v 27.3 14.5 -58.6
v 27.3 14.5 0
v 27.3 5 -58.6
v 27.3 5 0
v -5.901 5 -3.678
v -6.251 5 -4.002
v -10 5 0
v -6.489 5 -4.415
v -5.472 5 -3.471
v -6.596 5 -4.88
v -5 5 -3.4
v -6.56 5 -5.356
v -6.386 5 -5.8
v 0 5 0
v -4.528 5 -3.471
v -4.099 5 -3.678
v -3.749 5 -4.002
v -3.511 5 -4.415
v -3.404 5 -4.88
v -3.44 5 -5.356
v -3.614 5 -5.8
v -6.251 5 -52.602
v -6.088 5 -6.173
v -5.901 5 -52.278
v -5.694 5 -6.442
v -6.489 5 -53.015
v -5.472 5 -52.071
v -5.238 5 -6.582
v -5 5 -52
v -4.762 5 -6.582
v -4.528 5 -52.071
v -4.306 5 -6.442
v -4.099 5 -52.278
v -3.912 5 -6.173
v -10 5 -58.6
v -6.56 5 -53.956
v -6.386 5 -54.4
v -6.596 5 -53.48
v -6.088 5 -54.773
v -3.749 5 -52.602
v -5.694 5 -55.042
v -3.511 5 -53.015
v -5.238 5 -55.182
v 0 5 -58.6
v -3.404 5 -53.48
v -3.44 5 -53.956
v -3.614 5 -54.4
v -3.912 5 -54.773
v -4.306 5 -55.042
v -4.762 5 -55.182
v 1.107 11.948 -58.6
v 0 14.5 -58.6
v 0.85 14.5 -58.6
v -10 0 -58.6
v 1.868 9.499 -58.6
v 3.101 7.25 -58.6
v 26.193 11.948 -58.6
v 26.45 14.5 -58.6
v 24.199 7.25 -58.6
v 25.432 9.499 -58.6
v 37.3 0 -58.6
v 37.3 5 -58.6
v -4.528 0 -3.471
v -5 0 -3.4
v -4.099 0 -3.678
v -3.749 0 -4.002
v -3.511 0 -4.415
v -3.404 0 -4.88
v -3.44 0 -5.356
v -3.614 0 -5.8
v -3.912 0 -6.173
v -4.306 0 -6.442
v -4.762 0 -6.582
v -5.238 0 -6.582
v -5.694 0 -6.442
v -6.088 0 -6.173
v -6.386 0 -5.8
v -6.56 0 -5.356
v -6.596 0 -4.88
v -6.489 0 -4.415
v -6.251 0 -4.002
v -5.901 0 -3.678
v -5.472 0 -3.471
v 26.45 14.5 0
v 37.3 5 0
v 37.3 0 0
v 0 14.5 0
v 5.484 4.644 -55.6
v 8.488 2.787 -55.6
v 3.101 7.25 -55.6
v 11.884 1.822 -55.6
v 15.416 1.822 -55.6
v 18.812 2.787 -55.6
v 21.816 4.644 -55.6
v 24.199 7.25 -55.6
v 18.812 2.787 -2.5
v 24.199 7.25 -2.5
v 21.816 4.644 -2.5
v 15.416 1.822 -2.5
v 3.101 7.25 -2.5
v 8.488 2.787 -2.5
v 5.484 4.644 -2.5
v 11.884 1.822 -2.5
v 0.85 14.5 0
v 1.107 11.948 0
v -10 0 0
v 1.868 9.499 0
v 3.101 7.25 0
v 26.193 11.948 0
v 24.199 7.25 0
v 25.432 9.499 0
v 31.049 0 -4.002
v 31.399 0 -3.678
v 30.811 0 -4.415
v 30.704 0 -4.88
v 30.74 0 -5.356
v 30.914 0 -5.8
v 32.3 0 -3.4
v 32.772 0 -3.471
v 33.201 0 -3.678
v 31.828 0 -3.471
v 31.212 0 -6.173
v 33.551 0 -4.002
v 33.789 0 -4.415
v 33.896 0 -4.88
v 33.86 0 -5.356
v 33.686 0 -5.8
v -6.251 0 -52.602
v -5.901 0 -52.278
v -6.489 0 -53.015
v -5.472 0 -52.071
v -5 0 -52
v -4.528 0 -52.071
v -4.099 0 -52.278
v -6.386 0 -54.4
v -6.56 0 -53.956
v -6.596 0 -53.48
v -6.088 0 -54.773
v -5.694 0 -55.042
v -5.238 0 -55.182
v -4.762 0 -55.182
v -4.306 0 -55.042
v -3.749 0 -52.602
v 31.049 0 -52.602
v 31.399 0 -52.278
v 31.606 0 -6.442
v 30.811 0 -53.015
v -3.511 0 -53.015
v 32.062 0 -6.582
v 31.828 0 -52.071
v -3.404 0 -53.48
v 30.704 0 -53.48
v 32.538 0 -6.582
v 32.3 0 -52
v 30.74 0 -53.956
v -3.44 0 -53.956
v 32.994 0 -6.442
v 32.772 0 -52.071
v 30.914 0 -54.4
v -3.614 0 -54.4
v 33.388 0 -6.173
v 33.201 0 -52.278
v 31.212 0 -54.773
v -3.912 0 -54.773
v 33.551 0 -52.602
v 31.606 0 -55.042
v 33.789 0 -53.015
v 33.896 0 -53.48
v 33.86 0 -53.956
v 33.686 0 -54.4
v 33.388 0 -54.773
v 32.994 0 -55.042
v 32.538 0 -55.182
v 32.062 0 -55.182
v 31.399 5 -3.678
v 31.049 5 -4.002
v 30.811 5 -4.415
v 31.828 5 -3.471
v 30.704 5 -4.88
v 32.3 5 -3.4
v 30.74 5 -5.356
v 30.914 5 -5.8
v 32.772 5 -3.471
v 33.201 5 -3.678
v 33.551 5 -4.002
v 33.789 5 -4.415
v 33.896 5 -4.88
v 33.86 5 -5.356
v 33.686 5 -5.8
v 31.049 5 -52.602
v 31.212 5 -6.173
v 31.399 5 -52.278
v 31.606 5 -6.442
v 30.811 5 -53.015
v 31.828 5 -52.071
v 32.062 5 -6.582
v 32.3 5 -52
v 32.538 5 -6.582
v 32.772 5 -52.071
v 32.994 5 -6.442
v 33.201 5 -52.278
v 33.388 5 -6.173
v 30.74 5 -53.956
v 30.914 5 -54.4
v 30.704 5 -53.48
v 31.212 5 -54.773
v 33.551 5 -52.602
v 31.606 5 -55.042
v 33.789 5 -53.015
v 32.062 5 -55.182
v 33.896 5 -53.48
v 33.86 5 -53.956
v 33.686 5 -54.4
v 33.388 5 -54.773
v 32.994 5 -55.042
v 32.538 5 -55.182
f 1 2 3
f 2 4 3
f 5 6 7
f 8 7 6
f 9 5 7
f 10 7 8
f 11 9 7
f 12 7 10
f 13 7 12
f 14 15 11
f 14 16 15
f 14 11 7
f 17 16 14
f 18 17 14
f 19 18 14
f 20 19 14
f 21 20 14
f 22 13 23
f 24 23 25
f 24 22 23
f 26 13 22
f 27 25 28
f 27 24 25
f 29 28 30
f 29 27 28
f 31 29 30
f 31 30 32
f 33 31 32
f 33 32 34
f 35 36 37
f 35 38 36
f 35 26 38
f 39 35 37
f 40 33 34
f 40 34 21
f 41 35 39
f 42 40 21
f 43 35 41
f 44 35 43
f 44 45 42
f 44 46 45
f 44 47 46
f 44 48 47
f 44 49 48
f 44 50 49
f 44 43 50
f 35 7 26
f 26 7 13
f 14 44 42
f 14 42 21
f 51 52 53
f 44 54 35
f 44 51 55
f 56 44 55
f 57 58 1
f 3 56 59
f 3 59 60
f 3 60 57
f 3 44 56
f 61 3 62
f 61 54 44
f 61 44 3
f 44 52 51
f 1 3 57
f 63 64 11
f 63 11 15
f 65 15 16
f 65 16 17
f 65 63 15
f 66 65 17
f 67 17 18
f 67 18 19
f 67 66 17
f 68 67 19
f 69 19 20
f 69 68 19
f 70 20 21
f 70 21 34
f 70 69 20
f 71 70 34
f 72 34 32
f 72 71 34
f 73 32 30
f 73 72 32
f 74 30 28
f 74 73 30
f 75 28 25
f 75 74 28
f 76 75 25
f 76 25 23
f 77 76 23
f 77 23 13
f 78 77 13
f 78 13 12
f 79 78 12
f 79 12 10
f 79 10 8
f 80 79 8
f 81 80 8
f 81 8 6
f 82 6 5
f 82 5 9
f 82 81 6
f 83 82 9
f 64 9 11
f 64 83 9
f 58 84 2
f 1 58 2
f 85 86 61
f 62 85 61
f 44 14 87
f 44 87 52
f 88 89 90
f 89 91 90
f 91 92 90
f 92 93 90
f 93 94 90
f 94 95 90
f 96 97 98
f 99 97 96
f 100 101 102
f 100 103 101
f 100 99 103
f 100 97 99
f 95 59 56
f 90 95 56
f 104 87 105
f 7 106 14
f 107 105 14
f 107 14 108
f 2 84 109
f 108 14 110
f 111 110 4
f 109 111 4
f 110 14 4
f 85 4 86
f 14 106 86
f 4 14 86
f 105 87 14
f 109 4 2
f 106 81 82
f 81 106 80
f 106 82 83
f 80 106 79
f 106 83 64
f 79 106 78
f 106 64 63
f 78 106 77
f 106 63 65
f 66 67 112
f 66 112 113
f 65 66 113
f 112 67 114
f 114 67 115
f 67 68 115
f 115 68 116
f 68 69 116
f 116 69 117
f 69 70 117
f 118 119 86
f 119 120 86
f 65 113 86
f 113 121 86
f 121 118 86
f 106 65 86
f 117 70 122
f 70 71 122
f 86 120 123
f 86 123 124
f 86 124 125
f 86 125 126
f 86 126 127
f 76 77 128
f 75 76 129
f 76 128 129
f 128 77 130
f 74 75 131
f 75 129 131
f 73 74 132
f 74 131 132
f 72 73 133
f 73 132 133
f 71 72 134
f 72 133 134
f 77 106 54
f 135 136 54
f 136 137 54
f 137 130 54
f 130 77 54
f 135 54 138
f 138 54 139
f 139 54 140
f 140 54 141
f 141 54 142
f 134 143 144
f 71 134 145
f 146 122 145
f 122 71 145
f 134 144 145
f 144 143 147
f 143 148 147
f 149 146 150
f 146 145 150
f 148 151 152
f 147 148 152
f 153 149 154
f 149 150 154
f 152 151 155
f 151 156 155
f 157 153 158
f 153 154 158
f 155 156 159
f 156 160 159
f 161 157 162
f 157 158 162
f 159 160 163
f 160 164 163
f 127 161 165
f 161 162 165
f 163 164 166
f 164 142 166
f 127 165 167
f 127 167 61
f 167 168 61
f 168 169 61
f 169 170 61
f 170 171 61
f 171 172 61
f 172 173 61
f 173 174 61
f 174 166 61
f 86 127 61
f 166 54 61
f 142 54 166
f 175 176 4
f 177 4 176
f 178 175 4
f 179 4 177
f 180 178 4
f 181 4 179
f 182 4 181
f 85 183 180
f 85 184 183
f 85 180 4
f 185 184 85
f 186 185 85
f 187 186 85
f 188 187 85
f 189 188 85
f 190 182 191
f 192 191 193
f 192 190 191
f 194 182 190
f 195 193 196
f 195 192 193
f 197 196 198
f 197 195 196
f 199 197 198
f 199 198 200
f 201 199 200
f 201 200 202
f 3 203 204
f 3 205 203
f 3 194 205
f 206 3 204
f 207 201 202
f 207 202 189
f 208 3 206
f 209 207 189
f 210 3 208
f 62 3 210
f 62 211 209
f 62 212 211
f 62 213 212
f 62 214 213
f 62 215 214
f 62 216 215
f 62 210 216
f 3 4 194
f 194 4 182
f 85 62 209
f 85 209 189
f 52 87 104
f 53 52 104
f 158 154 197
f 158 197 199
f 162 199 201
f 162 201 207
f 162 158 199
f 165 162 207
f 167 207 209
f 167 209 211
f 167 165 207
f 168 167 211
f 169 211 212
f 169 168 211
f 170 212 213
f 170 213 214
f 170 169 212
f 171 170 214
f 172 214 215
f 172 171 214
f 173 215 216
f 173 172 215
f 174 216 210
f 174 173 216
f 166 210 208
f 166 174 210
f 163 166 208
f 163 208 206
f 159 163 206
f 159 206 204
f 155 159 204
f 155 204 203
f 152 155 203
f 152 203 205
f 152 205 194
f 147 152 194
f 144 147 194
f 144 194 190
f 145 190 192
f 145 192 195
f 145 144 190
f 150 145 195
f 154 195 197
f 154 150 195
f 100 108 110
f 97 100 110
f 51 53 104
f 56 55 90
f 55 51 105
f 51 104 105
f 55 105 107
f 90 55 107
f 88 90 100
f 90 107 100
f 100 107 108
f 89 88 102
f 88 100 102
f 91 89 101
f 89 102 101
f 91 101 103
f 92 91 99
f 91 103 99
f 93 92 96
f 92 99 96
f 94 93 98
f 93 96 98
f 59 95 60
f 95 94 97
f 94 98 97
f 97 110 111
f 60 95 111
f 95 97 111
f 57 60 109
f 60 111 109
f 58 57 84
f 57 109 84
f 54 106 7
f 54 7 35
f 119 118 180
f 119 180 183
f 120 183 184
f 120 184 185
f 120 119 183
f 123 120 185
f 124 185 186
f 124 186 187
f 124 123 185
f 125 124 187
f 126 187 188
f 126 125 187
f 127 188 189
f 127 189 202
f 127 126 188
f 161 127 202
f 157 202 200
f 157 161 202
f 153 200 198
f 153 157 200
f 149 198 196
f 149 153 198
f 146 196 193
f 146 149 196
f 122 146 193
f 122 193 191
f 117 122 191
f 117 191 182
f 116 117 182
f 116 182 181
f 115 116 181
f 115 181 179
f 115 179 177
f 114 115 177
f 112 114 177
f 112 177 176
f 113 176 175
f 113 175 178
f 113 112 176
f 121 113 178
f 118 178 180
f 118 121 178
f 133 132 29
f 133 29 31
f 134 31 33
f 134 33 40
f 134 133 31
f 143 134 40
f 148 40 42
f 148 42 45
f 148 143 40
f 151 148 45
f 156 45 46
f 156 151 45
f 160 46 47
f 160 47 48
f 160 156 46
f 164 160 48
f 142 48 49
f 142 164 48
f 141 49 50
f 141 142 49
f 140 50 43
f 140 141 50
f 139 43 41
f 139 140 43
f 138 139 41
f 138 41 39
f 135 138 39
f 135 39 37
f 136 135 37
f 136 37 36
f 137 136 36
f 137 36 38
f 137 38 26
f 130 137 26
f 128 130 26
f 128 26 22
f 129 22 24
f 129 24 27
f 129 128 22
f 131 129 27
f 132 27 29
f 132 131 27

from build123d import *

# Parameters (mm, degrees)
SKETCH_1_W          = 27.3
SKETCH_1_H          = 58.6
EXTRUDE_1_DEPTH     = 14.5
SKETCH_3_R          = 12.8
CUT_EXTRUDE_1_DEPTH = 67.253301805
SKETCH_7_W          = 27.3
SKETCH_7_H          = 7.25
EXTRUDE_2_DEPTH     = 3
EXTRUDE_START       = -58.6
EXTRUDE_3_DEPTH     = 2.5
SKETCH_1_3_W        = 10
SKETCH_1_3_H        = 58.6
SKETCH_1_3_R        = 1.6
EXTRUDE_4_DEPTH     = 5


with BuildPart() as part:
    # Эскиз1 → Бобышка-Вытянуть1 (new body)
    with BuildSketch(Plane(origin=(0, 0, 0), x_dir=(1, 0, 0), z_dir=(0, 1, 0))):
        with Locations((13.65, 29.3)):
            Rectangle(SKETCH_1_W, SKETCH_1_H)
    extrude(amount=EXTRUDE_1_DEPTH)

    # Эскиз3 → Вырез-Вытянуть1 (cut, through all)
    with BuildSketch(Plane.XY):
        with Locations((13.65, 14.5)):
            Circle(SKETCH_3_R)
    extrude(amount=-CUT_EXTRUDE_1_DEPTH, mode=Mode.SUBTRACT)

    # Эскиз7 → Бобышка-Вытянуть2 (add)
    with BuildSketch(Plane(origin=(0, 0, -58.6), x_dir=(-1, 0, 0), z_dir=(0, 0, -1))):
        with Locations((-13.65, 3.625)):
            Rectangle(SKETCH_7_W, SKETCH_7_H)
    extrude(amount=-EXTRUDE_2_DEPTH)

    # Эскиз7<2> → Бобышка-Вытянуть3 (add)
    with BuildSketch(Plane(origin=(0, 0, -58.6), x_dir=(-1, 0, 0), z_dir=(0, 0, -1)).offset(EXTRUDE_START)):
        with BuildLine():
            Line((-27.3, 14.5), (-27.3, 7.25))
            Line((-27.3, 7.25), (-24.198815099, 7.25))
            ThreePointArc((-24.198815099, 7.25), (-25.874255259, 10.704267743), (-26.45, 14.5))
            Line((-26.45, 14.5), (-27.3, 14.5))
        make_face()
        with BuildLine():
            Line((-24.198815099, 7.25), (-27.3, 7.25))
            Line((-27.3, 7.25), (-27.3, 0))
            Line((-27.3, 0), (0, 0))
            Line((0, 0), (0, 7.25))
            Line((0, 7.25), (-3.101184901, 7.25))
            ThreePointArc((-3.101184901, 7.25), (-13.65, 1.7), (-24.198815099, 7.25))
        make_face()
        with BuildLine():
            Line((-3.101184901, 7.25), (-24.198815099, 7.25))
            ThreePointArc((-24.198815099, 7.25), (-13.65, 1.7), (-3.101184901, 7.25))
        make_face()
        with BuildLine():
            ThreePointArc((-0.85, 14.5), (-1.425744741, 10.704267743), (-3.101184901, 7.25))
            Line((-3.101184901, 7.25), (0, 7.25))
            Line((0, 7.25), (0, 14.5))
            Line((0, 14.5), (-0.85, 14.5))
        make_face()
    extrude(amount=EXTRUDE_3_DEPTH)

    # Эскиз1<3> → Бобышка-Вытянуть4 (add)
    # profile 1 of 2: a face of its own
    with BuildSketch(Plane(origin=(0, 0, 0), x_dir=(1, 0, 0), z_dir=(0, 1, 0))):
        with Locations((-5, 29.3)):
            Rectangle(SKETCH_1_3_W, SKETCH_1_3_H)
        with Locations((-5, 5)):
            Circle(SKETCH_1_3_R, mode=Mode.SUBTRACT)
        with Locations((-5, 53.6)):
            Circle(SKETCH_1_3_R, mode=Mode.SUBTRACT)
    # profile 2 of 2: a face of its own
    with BuildSketch(Plane(origin=(0, 0, 0), x_dir=(1, 0, 0), z_dir=(0, 1, 0))):
        with Locations((32.3, 29.3)):
            Rectangle(SKETCH_1_3_W, SKETCH_1_3_H)
        with Locations((32.3, 5)):
            Circle(SKETCH_1_3_R, mode=Mode.SUBTRACT)
        with Locations((32.3, 53.6)):
            Circle(SKETCH_1_3_R, mode=Mode.SUBTRACT)
    extrude(amount=EXTRUDE_4_DEPTH)


solid = part.part
